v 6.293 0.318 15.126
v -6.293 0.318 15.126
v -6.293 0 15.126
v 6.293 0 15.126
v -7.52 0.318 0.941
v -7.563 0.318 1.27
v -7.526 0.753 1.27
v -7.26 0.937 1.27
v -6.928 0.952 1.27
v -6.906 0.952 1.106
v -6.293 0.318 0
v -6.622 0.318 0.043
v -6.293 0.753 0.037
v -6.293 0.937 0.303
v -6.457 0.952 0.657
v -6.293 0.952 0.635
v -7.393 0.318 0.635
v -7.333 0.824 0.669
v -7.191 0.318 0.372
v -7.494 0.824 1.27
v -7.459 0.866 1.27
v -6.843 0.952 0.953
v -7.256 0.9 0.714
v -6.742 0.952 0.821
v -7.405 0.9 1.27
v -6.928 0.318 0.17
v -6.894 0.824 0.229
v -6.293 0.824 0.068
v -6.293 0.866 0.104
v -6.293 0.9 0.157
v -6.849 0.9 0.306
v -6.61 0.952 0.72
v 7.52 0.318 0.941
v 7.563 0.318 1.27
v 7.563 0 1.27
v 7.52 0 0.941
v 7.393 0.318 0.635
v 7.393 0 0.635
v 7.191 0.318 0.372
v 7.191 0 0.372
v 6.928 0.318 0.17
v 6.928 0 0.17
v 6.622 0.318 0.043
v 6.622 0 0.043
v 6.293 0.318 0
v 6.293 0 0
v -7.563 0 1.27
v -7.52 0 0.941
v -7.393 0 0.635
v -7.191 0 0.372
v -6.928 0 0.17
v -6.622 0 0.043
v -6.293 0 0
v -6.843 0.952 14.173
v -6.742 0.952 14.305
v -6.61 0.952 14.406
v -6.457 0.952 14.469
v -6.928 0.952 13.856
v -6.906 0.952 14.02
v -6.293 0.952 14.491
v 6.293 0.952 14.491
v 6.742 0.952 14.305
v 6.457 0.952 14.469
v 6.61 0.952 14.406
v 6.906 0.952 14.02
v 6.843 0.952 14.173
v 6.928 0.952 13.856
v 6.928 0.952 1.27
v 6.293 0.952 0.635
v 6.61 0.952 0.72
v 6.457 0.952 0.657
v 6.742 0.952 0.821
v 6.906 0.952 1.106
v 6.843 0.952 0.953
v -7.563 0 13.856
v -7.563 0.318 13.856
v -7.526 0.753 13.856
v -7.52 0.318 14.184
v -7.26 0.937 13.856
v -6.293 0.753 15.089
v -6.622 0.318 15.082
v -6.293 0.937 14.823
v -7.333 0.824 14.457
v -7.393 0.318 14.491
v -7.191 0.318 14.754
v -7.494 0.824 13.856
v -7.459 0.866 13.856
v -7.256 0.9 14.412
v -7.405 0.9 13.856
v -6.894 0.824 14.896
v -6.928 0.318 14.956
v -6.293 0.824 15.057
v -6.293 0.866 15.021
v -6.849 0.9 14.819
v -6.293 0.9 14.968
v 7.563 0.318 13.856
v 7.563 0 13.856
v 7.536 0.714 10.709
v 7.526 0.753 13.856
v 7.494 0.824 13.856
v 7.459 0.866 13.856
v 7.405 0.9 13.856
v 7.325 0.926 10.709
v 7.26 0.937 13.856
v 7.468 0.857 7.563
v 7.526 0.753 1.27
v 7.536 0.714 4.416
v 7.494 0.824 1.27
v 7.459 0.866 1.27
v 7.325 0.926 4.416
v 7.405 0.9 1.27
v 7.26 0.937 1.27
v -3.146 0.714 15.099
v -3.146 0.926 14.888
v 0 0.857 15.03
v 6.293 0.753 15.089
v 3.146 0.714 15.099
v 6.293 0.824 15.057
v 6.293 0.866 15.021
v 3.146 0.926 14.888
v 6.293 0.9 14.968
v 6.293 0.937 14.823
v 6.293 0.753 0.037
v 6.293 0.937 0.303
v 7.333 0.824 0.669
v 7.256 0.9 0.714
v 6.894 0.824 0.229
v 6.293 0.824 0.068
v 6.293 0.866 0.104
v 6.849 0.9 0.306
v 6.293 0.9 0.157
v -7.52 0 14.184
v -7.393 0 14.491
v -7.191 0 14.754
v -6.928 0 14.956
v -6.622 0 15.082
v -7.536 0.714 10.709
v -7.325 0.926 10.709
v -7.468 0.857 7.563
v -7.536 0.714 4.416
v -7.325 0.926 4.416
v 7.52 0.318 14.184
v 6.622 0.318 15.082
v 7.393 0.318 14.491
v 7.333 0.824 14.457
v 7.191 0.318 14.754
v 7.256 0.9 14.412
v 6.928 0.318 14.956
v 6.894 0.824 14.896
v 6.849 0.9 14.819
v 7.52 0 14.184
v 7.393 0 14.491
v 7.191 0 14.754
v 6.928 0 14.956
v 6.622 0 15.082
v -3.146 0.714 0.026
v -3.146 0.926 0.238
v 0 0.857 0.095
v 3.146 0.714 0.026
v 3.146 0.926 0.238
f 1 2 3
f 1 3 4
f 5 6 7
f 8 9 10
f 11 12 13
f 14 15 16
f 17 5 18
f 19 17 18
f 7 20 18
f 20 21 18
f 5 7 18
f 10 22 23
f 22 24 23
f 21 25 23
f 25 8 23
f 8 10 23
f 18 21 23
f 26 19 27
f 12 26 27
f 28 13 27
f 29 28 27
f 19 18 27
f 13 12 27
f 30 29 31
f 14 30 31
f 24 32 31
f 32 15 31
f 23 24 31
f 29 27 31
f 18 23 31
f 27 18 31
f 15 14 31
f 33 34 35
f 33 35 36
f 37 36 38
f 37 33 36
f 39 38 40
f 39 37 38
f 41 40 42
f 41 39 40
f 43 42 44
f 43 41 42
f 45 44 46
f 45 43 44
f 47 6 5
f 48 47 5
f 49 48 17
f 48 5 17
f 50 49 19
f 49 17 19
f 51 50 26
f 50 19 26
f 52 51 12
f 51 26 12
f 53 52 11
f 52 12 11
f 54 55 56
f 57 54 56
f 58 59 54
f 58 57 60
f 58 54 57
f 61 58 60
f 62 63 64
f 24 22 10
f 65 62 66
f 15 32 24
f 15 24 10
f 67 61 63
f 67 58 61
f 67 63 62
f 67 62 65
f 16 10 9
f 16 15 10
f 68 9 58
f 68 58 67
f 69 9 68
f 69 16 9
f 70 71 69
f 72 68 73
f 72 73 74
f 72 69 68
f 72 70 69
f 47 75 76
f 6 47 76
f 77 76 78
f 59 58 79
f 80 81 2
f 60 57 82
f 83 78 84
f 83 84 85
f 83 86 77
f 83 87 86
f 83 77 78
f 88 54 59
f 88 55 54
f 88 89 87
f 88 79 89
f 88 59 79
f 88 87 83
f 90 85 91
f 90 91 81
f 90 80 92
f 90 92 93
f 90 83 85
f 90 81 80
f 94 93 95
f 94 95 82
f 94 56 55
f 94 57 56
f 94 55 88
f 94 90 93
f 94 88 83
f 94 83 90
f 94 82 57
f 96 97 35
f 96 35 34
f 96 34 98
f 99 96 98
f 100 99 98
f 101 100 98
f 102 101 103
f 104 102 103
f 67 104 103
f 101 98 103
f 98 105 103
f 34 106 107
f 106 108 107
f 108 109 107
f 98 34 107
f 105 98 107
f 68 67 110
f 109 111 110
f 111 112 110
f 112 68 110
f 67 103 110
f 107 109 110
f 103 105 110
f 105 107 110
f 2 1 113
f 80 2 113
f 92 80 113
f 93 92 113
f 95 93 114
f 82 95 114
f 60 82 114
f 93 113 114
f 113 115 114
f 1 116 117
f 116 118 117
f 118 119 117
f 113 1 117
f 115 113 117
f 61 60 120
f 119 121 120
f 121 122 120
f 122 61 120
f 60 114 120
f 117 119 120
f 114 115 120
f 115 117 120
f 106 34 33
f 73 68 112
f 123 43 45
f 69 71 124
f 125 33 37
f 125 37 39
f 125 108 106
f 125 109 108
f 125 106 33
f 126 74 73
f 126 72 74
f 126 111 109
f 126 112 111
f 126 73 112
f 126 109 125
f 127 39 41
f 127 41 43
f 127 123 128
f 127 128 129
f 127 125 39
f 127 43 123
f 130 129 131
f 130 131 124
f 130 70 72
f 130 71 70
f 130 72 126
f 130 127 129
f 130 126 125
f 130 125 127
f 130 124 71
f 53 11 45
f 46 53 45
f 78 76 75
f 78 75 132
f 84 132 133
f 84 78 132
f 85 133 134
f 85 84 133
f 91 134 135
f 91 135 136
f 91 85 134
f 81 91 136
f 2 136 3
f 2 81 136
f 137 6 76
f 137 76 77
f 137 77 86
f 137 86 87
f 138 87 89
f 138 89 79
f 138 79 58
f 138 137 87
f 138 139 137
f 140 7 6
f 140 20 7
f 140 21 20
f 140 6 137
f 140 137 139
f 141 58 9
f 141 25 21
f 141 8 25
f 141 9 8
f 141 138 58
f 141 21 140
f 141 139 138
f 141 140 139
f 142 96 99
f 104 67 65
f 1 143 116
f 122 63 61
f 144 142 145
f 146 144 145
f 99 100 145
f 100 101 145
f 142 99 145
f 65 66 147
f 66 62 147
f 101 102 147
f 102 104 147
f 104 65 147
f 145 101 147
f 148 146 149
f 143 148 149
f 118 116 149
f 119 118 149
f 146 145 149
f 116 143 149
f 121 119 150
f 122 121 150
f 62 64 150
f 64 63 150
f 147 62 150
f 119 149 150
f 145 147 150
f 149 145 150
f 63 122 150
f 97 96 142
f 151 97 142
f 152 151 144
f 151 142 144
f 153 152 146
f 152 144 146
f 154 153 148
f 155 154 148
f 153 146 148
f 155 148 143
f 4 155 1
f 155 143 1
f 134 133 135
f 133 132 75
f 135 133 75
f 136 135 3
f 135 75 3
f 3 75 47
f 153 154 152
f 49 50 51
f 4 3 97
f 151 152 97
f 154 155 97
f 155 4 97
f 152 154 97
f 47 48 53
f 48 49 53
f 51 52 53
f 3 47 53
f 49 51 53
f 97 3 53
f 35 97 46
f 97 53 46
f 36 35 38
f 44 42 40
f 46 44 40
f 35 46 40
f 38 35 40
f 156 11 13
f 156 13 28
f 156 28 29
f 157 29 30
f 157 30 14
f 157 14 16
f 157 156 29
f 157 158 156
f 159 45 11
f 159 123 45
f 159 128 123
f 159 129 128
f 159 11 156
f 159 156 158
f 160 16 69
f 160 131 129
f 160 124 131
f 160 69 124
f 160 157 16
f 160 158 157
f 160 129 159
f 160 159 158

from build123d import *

# Parameters (mm, degrees)
SKETCH1_W           = 15.1257
SKETCH1_H           = 0.9525
BOSS_EXTRUDE1_DEPTH = 15.1257
FILLET3_R           = 1.27
FILLET1_SIZE        = 0.635


with BuildPart() as part:
    # Sketch1 → Boss-Extrude1 (new body)
    with BuildSketch(Plane.XY):
        with Locations((0, 0.47625)):
            Rectangle(SKETCH1_W, SKETCH1_H)
    extrude(amount=BOSS_EXTRUDE1_DEPTH)

    # Fillet3
    fillet3_edges = [part.edges().sort_by_distance(p)[0] for p in [
        (7.56285, 0.47625, 15.1257),
        (-7.56285, 0.47625, 15.1257),
        (7.56285, 0.47625, 0),
        (-7.56285, 0.47625, 0),
    ]]
    fillet(fillet3_edges, radius=FILLET3_R)

    # Fillet1
    # a fillet whose section is not a circle: 0.635 mm, written as the material it takes off along each edge
    with BuildSketch(Plane(origin=(7.56285, 0.9525, 1.27), x_dir=(0, -1, 0), z_dir=(0, 0, 1)), Plane(origin=(6.29285, 0.9525, 15.1257), x_dir=(0, -1, 0), z_dir=(-1, 0, 0))) as fillet1_piece_1:
        with BuildLine():
            Bezier((FILLET1_SIZE, 0), (0, 0), (0, -FILLET1_SIZE), weights=[1, 2.333333333, 1])
            Line((0, -FILLET1_SIZE), (-FILLET1_SIZE * 0.02, -FILLET1_SIZE))
            Line((-FILLET1_SIZE * 0.02, -FILLET1_SIZE), (-FILLET1_SIZE * 0.02, FILLET1_SIZE * 0.02))
            Line((-FILLET1_SIZE * 0.02, FILLET1_SIZE * 0.02), (FILLET1_SIZE, FILLET1_SIZE * 0.02))
            Line((FILLET1_SIZE, FILLET1_SIZE * 0.02), (FILLET1_SIZE, 0))
        make_face()
    extrude(amount=12.5857, mode=Mode.SUBTRACT)
    with BuildSketch(Plane(origin=(-7.56285, 0.9525, 1.27), x_dir=(0, -1, 0), z_dir=(0, 0, 1)), Plane(origin=(6.29285, 0.9525, 0), x_dir=(0, -1, 0), z_dir=(-1, 0, 0))) as fillet1_piece_2:
        with BuildLine():
            Bezier((FILLET1_SIZE, 0), (0, 0), (0, FILLET1_SIZE), weights=[1, 2.333333333, 1])
            Line((0, FILLET1_SIZE), (-FILLET1_SIZE * 0.02, FILLET1_SIZE))
            Line((-FILLET1_SIZE * 0.02, FILLET1_SIZE), (-FILLET1_SIZE * 0.02, -FILLET1_SIZE * 0.02))
            Line((-FILLET1_SIZE * 0.02, -FILLET1_SIZE * 0.02), (FILLET1_SIZE, -FILLET1_SIZE * 0.02))
            Line((FILLET1_SIZE, -FILLET1_SIZE * 0.02), (FILLET1_SIZE, 0))
        make_face()
    extrude(amount=12.5857, mode=Mode.SUBTRACT)
    with BuildSketch(Plane(origin=(6.29285, 0.9525, 1.27), x_dir=(1, 0, 0), z_dir=(0, 0, 1))) as fillet1_piece_3:
        with BuildLine():
            Bezier((1.27, -FILLET1_SIZE), (1.27, 0), (1.27 - FILLET1_SIZE, 0), weights=[1, 2.333333333, 1])
            Line((1.27 - FILLET1_SIZE, 0), (1.27 - FILLET1_SIZE, FILLET1_SIZE * 0.02))
            Line((1.27 - FILLET1_SIZE, FILLET1_SIZE * 0.02), (1.27 + FILLET1_SIZE * 0.02, FILLET1_SIZE * 0.02))
            Line((1.27 + FILLET1_SIZE * 0.02, FILLET1_SIZE * 0.02), (1.27 + FILLET1_SIZE * 0.02, -FILLET1_SIZE))
            Line((1.27 + FILLET1_SIZE * 0.02, -FILLET1_SIZE), (1.27, -FILLET1_SIZE))
        make_face()
    revolve(axis=Axis((6.29285, 0.9525, 1.27), (0, 1, 0)), revolution_arc=90, mode=Mode.SUBTRACT)
    with BuildSketch(Plane(origin=(6.29285, 0.9525, 13.8557), x_dir=(1, 0, 0), z_dir=(0, 0, -1))) as fillet1_piece_4:
        with BuildLine():
            Bezier((1.27, FILLET1_SIZE), (1.27, 0), (1.27 - FILLET1_SIZE, 0), weights=[1, 2.333333333, 1])
            Line((1.27 - FILLET1_SIZE, 0), (1.27 - FILLET1_SIZE, -FILLET1_SIZE * 0.02))
            Line((1.27 - FILLET1_SIZE, -FILLET1_SIZE * 0.02), (1.27 + FILLET1_SIZE * 0.02, -FILLET1_SIZE * 0.02))
            Line((1.27 + FILLET1_SIZE * 0.02, -FILLET1_SIZE * 0.02), (1.27 + FILLET1_SIZE * 0.02, FILLET1_SIZE))
            Line((1.27 + FILLET1_SIZE * 0.02, FILLET1_SIZE), (1.27, FILLET1_SIZE))
        make_face()
    revolve(axis=Axis((6.29285, 0.9525, 13.8557), (0, -1, 0)), revolution_arc=90, mode=Mode.SUBTRACT)
    with BuildSketch(Plane(origin=(-6.29285, 0.9525, 13.8557), x_dir=(-1, 0, 0), z_dir=(0, 0, -1))) as fillet1_piece_5:
        with BuildLine():
            Bezier((1.27, -FILLET1_SIZE), (1.27, 0), (1.27 - FILLET1_SIZE, 0), weights=[1, 2.333333333, 1])
            Line((1.27 - FILLET1_SIZE, 0), (1.27 - FILLET1_SIZE, FILLET1_SIZE * 0.02))
            Line((1.27 - FILLET1_SIZE, FILLET1_SIZE * 0.02), (1.27 + FILLET1_SIZE * 0.02, FILLET1_SIZE * 0.02))
            Line((1.27 + FILLET1_SIZE * 0.02, FILLET1_SIZE * 0.02), (1.27 + FILLET1_SIZE * 0.02, -FILLET1_SIZE))
            Line((1.27 + FILLET1_SIZE * 0.02, -FILLET1_SIZE), (1.27, -FILLET1_SIZE))
        make_face()
    revolve(axis=Axis((-6.29285, 0.9525, 13.8557), (0, 1, 0)), revolution_arc=90, mode=Mode.SUBTRACT)
    with BuildSketch(Plane(origin=(-6.29285, 0.9525, 1.27), x_dir=(-1, 0, 0), z_dir=(0, 0, 1))) as fillet1_piece_6:
        with BuildLine():
            Bezier((1.27, FILLET1_SIZE), (1.27, 0), (1.27 - FILLET1_SIZE, 0), weights=[1, 2.333333333, 1])
            Line((1.27 - FILLET1_SIZE, 0), (1.27 - FILLET1_SIZE, -FILLET1_SIZE * 0.02))
            Line((1.27 - FILLET1_SIZE, -FILLET1_SIZE * 0.02), (1.27 + FILLET1_SIZE * 0.02, -FILLET1_SIZE * 0.02))
            Line((1.27 + FILLET1_SIZE * 0.02, -FILLET1_SIZE * 0.02), (1.27 + FILLET1_SIZE * 0.02, FILLET1_SIZE))
            Line((1.27 + FILLET1_SIZE * 0.02, FILLET1_SIZE), (1.27, FILLET1_SIZE))
        make_face()
    revolve(axis=Axis((-6.29285, 0.9525, 1.27), (0, -1, 0)), revolution_arc=90, mode=Mode.SUBTRACT)


solid = part.part
